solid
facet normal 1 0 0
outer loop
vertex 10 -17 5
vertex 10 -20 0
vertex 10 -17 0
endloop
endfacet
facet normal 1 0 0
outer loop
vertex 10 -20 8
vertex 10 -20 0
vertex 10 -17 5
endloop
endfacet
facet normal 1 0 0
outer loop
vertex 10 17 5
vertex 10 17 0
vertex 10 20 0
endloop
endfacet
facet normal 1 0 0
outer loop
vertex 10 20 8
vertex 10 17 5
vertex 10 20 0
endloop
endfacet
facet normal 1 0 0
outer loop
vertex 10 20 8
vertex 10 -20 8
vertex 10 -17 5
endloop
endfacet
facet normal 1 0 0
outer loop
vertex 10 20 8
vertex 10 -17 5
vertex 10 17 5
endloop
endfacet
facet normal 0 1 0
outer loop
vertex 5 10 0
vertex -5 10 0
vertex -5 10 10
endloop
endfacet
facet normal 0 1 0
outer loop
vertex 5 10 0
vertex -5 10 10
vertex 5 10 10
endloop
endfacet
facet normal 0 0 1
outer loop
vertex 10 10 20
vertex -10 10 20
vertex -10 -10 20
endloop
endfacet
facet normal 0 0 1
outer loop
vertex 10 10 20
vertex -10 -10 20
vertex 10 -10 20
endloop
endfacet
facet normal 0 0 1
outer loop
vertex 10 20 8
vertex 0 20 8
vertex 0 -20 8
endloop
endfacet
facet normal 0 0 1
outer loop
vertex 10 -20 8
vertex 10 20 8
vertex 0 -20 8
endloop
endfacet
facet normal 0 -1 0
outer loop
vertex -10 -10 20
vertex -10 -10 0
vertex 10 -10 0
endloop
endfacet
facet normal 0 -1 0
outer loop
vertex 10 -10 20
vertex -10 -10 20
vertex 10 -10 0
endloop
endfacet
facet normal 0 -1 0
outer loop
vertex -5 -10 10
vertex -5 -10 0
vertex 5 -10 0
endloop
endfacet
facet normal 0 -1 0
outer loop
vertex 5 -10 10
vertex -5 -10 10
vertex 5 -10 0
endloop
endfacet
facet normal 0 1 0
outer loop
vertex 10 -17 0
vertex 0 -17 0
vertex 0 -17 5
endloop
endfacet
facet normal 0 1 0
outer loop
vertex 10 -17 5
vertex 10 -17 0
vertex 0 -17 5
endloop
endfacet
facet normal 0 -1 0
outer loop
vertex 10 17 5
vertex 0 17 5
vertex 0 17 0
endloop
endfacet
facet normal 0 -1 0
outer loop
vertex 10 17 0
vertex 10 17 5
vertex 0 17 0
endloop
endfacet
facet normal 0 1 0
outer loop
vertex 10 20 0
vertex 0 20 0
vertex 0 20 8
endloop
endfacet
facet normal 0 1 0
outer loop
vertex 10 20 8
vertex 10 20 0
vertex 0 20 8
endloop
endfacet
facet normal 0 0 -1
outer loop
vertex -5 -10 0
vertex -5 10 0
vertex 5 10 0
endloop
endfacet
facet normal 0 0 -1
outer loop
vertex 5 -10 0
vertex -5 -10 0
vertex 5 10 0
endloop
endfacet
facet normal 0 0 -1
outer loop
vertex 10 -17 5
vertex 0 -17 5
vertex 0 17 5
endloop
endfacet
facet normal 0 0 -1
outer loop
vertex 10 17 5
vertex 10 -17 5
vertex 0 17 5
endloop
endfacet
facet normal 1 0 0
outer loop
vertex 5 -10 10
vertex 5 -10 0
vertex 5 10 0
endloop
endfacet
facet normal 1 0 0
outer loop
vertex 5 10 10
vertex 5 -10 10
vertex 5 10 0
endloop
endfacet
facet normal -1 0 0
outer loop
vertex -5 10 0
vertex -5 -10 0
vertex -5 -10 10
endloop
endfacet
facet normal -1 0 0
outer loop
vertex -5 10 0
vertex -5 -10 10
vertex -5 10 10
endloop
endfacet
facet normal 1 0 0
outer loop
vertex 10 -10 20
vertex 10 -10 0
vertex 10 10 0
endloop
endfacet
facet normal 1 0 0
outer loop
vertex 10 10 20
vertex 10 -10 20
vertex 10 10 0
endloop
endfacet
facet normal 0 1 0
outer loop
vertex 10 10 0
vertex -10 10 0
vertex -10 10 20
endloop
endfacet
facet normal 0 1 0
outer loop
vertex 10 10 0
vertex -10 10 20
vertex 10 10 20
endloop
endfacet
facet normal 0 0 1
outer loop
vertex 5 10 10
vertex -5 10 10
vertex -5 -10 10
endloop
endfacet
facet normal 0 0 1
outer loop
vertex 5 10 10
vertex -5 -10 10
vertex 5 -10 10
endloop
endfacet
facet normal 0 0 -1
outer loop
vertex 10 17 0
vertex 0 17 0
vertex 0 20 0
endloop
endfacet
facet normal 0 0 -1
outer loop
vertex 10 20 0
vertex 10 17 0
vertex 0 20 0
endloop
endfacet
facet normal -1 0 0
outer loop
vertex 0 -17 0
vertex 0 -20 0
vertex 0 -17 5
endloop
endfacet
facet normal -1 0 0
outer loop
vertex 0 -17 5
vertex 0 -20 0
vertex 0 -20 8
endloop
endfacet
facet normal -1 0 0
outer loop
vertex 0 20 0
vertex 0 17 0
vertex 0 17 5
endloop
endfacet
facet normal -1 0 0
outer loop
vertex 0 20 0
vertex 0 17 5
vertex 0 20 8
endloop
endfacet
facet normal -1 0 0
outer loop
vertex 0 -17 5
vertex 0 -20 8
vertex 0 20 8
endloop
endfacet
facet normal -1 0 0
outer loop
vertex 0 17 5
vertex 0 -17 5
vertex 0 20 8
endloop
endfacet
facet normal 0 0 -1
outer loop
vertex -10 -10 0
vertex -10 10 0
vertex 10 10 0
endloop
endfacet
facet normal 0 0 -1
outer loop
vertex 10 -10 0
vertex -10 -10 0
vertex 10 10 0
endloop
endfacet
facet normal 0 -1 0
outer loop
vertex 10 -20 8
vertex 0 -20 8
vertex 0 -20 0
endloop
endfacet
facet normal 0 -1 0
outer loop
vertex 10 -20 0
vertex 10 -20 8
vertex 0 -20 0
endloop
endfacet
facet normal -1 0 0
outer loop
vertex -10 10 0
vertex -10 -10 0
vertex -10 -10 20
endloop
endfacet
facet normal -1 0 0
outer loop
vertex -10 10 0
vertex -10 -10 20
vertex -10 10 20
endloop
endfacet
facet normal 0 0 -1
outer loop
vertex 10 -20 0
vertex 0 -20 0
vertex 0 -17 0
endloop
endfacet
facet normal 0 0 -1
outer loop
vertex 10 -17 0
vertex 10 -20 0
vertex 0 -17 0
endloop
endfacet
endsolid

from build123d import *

# Parameters (mm, degrees)
F0_W     = 20
F0_H     = 20
F1_DEPTH = 20
F2_W     = 10
F2_H     = 20
F3_DEPTH = 10
F4_W     = 17
F4_H     = 3
F5_DEPTH = 10


with BuildPart() as f1:
    # F0 (on Top) → F1 (new body)
    with BuildSketch(Plane.XY):
        Rectangle(F0_W, F0_H)
    extrude(amount=F1_DEPTH)


with BuildPart() as f3:
    # F2 (on Top) → F3 (new body)
    with BuildSketch(Plane.XY):
        Rectangle(F2_W, F2_H)
    extrude(amount=F3_DEPTH)


with BuildPart() as f5:
    # F4 (on Right) → F5 (new body)
    with BuildSketch(Plane.YZ):
        Polygon((-20, 8), (-20, 0), (-17, 0), (-17, 5), (-17, 8), align=None)
        with Locations((-8.5, 6.5)):
            Rectangle(F4_W, F4_H)
        with Locations((8.5, 6.5)):
            Rectangle(F4_W, F4_H)
        Polygon((17, 8), (17, 5), (17, 0), (20, 0), (20, 8), align=None)
    extrude(amount=F5_DEPTH)


solid = Compound([f1.part, f3.part, f5.part])
